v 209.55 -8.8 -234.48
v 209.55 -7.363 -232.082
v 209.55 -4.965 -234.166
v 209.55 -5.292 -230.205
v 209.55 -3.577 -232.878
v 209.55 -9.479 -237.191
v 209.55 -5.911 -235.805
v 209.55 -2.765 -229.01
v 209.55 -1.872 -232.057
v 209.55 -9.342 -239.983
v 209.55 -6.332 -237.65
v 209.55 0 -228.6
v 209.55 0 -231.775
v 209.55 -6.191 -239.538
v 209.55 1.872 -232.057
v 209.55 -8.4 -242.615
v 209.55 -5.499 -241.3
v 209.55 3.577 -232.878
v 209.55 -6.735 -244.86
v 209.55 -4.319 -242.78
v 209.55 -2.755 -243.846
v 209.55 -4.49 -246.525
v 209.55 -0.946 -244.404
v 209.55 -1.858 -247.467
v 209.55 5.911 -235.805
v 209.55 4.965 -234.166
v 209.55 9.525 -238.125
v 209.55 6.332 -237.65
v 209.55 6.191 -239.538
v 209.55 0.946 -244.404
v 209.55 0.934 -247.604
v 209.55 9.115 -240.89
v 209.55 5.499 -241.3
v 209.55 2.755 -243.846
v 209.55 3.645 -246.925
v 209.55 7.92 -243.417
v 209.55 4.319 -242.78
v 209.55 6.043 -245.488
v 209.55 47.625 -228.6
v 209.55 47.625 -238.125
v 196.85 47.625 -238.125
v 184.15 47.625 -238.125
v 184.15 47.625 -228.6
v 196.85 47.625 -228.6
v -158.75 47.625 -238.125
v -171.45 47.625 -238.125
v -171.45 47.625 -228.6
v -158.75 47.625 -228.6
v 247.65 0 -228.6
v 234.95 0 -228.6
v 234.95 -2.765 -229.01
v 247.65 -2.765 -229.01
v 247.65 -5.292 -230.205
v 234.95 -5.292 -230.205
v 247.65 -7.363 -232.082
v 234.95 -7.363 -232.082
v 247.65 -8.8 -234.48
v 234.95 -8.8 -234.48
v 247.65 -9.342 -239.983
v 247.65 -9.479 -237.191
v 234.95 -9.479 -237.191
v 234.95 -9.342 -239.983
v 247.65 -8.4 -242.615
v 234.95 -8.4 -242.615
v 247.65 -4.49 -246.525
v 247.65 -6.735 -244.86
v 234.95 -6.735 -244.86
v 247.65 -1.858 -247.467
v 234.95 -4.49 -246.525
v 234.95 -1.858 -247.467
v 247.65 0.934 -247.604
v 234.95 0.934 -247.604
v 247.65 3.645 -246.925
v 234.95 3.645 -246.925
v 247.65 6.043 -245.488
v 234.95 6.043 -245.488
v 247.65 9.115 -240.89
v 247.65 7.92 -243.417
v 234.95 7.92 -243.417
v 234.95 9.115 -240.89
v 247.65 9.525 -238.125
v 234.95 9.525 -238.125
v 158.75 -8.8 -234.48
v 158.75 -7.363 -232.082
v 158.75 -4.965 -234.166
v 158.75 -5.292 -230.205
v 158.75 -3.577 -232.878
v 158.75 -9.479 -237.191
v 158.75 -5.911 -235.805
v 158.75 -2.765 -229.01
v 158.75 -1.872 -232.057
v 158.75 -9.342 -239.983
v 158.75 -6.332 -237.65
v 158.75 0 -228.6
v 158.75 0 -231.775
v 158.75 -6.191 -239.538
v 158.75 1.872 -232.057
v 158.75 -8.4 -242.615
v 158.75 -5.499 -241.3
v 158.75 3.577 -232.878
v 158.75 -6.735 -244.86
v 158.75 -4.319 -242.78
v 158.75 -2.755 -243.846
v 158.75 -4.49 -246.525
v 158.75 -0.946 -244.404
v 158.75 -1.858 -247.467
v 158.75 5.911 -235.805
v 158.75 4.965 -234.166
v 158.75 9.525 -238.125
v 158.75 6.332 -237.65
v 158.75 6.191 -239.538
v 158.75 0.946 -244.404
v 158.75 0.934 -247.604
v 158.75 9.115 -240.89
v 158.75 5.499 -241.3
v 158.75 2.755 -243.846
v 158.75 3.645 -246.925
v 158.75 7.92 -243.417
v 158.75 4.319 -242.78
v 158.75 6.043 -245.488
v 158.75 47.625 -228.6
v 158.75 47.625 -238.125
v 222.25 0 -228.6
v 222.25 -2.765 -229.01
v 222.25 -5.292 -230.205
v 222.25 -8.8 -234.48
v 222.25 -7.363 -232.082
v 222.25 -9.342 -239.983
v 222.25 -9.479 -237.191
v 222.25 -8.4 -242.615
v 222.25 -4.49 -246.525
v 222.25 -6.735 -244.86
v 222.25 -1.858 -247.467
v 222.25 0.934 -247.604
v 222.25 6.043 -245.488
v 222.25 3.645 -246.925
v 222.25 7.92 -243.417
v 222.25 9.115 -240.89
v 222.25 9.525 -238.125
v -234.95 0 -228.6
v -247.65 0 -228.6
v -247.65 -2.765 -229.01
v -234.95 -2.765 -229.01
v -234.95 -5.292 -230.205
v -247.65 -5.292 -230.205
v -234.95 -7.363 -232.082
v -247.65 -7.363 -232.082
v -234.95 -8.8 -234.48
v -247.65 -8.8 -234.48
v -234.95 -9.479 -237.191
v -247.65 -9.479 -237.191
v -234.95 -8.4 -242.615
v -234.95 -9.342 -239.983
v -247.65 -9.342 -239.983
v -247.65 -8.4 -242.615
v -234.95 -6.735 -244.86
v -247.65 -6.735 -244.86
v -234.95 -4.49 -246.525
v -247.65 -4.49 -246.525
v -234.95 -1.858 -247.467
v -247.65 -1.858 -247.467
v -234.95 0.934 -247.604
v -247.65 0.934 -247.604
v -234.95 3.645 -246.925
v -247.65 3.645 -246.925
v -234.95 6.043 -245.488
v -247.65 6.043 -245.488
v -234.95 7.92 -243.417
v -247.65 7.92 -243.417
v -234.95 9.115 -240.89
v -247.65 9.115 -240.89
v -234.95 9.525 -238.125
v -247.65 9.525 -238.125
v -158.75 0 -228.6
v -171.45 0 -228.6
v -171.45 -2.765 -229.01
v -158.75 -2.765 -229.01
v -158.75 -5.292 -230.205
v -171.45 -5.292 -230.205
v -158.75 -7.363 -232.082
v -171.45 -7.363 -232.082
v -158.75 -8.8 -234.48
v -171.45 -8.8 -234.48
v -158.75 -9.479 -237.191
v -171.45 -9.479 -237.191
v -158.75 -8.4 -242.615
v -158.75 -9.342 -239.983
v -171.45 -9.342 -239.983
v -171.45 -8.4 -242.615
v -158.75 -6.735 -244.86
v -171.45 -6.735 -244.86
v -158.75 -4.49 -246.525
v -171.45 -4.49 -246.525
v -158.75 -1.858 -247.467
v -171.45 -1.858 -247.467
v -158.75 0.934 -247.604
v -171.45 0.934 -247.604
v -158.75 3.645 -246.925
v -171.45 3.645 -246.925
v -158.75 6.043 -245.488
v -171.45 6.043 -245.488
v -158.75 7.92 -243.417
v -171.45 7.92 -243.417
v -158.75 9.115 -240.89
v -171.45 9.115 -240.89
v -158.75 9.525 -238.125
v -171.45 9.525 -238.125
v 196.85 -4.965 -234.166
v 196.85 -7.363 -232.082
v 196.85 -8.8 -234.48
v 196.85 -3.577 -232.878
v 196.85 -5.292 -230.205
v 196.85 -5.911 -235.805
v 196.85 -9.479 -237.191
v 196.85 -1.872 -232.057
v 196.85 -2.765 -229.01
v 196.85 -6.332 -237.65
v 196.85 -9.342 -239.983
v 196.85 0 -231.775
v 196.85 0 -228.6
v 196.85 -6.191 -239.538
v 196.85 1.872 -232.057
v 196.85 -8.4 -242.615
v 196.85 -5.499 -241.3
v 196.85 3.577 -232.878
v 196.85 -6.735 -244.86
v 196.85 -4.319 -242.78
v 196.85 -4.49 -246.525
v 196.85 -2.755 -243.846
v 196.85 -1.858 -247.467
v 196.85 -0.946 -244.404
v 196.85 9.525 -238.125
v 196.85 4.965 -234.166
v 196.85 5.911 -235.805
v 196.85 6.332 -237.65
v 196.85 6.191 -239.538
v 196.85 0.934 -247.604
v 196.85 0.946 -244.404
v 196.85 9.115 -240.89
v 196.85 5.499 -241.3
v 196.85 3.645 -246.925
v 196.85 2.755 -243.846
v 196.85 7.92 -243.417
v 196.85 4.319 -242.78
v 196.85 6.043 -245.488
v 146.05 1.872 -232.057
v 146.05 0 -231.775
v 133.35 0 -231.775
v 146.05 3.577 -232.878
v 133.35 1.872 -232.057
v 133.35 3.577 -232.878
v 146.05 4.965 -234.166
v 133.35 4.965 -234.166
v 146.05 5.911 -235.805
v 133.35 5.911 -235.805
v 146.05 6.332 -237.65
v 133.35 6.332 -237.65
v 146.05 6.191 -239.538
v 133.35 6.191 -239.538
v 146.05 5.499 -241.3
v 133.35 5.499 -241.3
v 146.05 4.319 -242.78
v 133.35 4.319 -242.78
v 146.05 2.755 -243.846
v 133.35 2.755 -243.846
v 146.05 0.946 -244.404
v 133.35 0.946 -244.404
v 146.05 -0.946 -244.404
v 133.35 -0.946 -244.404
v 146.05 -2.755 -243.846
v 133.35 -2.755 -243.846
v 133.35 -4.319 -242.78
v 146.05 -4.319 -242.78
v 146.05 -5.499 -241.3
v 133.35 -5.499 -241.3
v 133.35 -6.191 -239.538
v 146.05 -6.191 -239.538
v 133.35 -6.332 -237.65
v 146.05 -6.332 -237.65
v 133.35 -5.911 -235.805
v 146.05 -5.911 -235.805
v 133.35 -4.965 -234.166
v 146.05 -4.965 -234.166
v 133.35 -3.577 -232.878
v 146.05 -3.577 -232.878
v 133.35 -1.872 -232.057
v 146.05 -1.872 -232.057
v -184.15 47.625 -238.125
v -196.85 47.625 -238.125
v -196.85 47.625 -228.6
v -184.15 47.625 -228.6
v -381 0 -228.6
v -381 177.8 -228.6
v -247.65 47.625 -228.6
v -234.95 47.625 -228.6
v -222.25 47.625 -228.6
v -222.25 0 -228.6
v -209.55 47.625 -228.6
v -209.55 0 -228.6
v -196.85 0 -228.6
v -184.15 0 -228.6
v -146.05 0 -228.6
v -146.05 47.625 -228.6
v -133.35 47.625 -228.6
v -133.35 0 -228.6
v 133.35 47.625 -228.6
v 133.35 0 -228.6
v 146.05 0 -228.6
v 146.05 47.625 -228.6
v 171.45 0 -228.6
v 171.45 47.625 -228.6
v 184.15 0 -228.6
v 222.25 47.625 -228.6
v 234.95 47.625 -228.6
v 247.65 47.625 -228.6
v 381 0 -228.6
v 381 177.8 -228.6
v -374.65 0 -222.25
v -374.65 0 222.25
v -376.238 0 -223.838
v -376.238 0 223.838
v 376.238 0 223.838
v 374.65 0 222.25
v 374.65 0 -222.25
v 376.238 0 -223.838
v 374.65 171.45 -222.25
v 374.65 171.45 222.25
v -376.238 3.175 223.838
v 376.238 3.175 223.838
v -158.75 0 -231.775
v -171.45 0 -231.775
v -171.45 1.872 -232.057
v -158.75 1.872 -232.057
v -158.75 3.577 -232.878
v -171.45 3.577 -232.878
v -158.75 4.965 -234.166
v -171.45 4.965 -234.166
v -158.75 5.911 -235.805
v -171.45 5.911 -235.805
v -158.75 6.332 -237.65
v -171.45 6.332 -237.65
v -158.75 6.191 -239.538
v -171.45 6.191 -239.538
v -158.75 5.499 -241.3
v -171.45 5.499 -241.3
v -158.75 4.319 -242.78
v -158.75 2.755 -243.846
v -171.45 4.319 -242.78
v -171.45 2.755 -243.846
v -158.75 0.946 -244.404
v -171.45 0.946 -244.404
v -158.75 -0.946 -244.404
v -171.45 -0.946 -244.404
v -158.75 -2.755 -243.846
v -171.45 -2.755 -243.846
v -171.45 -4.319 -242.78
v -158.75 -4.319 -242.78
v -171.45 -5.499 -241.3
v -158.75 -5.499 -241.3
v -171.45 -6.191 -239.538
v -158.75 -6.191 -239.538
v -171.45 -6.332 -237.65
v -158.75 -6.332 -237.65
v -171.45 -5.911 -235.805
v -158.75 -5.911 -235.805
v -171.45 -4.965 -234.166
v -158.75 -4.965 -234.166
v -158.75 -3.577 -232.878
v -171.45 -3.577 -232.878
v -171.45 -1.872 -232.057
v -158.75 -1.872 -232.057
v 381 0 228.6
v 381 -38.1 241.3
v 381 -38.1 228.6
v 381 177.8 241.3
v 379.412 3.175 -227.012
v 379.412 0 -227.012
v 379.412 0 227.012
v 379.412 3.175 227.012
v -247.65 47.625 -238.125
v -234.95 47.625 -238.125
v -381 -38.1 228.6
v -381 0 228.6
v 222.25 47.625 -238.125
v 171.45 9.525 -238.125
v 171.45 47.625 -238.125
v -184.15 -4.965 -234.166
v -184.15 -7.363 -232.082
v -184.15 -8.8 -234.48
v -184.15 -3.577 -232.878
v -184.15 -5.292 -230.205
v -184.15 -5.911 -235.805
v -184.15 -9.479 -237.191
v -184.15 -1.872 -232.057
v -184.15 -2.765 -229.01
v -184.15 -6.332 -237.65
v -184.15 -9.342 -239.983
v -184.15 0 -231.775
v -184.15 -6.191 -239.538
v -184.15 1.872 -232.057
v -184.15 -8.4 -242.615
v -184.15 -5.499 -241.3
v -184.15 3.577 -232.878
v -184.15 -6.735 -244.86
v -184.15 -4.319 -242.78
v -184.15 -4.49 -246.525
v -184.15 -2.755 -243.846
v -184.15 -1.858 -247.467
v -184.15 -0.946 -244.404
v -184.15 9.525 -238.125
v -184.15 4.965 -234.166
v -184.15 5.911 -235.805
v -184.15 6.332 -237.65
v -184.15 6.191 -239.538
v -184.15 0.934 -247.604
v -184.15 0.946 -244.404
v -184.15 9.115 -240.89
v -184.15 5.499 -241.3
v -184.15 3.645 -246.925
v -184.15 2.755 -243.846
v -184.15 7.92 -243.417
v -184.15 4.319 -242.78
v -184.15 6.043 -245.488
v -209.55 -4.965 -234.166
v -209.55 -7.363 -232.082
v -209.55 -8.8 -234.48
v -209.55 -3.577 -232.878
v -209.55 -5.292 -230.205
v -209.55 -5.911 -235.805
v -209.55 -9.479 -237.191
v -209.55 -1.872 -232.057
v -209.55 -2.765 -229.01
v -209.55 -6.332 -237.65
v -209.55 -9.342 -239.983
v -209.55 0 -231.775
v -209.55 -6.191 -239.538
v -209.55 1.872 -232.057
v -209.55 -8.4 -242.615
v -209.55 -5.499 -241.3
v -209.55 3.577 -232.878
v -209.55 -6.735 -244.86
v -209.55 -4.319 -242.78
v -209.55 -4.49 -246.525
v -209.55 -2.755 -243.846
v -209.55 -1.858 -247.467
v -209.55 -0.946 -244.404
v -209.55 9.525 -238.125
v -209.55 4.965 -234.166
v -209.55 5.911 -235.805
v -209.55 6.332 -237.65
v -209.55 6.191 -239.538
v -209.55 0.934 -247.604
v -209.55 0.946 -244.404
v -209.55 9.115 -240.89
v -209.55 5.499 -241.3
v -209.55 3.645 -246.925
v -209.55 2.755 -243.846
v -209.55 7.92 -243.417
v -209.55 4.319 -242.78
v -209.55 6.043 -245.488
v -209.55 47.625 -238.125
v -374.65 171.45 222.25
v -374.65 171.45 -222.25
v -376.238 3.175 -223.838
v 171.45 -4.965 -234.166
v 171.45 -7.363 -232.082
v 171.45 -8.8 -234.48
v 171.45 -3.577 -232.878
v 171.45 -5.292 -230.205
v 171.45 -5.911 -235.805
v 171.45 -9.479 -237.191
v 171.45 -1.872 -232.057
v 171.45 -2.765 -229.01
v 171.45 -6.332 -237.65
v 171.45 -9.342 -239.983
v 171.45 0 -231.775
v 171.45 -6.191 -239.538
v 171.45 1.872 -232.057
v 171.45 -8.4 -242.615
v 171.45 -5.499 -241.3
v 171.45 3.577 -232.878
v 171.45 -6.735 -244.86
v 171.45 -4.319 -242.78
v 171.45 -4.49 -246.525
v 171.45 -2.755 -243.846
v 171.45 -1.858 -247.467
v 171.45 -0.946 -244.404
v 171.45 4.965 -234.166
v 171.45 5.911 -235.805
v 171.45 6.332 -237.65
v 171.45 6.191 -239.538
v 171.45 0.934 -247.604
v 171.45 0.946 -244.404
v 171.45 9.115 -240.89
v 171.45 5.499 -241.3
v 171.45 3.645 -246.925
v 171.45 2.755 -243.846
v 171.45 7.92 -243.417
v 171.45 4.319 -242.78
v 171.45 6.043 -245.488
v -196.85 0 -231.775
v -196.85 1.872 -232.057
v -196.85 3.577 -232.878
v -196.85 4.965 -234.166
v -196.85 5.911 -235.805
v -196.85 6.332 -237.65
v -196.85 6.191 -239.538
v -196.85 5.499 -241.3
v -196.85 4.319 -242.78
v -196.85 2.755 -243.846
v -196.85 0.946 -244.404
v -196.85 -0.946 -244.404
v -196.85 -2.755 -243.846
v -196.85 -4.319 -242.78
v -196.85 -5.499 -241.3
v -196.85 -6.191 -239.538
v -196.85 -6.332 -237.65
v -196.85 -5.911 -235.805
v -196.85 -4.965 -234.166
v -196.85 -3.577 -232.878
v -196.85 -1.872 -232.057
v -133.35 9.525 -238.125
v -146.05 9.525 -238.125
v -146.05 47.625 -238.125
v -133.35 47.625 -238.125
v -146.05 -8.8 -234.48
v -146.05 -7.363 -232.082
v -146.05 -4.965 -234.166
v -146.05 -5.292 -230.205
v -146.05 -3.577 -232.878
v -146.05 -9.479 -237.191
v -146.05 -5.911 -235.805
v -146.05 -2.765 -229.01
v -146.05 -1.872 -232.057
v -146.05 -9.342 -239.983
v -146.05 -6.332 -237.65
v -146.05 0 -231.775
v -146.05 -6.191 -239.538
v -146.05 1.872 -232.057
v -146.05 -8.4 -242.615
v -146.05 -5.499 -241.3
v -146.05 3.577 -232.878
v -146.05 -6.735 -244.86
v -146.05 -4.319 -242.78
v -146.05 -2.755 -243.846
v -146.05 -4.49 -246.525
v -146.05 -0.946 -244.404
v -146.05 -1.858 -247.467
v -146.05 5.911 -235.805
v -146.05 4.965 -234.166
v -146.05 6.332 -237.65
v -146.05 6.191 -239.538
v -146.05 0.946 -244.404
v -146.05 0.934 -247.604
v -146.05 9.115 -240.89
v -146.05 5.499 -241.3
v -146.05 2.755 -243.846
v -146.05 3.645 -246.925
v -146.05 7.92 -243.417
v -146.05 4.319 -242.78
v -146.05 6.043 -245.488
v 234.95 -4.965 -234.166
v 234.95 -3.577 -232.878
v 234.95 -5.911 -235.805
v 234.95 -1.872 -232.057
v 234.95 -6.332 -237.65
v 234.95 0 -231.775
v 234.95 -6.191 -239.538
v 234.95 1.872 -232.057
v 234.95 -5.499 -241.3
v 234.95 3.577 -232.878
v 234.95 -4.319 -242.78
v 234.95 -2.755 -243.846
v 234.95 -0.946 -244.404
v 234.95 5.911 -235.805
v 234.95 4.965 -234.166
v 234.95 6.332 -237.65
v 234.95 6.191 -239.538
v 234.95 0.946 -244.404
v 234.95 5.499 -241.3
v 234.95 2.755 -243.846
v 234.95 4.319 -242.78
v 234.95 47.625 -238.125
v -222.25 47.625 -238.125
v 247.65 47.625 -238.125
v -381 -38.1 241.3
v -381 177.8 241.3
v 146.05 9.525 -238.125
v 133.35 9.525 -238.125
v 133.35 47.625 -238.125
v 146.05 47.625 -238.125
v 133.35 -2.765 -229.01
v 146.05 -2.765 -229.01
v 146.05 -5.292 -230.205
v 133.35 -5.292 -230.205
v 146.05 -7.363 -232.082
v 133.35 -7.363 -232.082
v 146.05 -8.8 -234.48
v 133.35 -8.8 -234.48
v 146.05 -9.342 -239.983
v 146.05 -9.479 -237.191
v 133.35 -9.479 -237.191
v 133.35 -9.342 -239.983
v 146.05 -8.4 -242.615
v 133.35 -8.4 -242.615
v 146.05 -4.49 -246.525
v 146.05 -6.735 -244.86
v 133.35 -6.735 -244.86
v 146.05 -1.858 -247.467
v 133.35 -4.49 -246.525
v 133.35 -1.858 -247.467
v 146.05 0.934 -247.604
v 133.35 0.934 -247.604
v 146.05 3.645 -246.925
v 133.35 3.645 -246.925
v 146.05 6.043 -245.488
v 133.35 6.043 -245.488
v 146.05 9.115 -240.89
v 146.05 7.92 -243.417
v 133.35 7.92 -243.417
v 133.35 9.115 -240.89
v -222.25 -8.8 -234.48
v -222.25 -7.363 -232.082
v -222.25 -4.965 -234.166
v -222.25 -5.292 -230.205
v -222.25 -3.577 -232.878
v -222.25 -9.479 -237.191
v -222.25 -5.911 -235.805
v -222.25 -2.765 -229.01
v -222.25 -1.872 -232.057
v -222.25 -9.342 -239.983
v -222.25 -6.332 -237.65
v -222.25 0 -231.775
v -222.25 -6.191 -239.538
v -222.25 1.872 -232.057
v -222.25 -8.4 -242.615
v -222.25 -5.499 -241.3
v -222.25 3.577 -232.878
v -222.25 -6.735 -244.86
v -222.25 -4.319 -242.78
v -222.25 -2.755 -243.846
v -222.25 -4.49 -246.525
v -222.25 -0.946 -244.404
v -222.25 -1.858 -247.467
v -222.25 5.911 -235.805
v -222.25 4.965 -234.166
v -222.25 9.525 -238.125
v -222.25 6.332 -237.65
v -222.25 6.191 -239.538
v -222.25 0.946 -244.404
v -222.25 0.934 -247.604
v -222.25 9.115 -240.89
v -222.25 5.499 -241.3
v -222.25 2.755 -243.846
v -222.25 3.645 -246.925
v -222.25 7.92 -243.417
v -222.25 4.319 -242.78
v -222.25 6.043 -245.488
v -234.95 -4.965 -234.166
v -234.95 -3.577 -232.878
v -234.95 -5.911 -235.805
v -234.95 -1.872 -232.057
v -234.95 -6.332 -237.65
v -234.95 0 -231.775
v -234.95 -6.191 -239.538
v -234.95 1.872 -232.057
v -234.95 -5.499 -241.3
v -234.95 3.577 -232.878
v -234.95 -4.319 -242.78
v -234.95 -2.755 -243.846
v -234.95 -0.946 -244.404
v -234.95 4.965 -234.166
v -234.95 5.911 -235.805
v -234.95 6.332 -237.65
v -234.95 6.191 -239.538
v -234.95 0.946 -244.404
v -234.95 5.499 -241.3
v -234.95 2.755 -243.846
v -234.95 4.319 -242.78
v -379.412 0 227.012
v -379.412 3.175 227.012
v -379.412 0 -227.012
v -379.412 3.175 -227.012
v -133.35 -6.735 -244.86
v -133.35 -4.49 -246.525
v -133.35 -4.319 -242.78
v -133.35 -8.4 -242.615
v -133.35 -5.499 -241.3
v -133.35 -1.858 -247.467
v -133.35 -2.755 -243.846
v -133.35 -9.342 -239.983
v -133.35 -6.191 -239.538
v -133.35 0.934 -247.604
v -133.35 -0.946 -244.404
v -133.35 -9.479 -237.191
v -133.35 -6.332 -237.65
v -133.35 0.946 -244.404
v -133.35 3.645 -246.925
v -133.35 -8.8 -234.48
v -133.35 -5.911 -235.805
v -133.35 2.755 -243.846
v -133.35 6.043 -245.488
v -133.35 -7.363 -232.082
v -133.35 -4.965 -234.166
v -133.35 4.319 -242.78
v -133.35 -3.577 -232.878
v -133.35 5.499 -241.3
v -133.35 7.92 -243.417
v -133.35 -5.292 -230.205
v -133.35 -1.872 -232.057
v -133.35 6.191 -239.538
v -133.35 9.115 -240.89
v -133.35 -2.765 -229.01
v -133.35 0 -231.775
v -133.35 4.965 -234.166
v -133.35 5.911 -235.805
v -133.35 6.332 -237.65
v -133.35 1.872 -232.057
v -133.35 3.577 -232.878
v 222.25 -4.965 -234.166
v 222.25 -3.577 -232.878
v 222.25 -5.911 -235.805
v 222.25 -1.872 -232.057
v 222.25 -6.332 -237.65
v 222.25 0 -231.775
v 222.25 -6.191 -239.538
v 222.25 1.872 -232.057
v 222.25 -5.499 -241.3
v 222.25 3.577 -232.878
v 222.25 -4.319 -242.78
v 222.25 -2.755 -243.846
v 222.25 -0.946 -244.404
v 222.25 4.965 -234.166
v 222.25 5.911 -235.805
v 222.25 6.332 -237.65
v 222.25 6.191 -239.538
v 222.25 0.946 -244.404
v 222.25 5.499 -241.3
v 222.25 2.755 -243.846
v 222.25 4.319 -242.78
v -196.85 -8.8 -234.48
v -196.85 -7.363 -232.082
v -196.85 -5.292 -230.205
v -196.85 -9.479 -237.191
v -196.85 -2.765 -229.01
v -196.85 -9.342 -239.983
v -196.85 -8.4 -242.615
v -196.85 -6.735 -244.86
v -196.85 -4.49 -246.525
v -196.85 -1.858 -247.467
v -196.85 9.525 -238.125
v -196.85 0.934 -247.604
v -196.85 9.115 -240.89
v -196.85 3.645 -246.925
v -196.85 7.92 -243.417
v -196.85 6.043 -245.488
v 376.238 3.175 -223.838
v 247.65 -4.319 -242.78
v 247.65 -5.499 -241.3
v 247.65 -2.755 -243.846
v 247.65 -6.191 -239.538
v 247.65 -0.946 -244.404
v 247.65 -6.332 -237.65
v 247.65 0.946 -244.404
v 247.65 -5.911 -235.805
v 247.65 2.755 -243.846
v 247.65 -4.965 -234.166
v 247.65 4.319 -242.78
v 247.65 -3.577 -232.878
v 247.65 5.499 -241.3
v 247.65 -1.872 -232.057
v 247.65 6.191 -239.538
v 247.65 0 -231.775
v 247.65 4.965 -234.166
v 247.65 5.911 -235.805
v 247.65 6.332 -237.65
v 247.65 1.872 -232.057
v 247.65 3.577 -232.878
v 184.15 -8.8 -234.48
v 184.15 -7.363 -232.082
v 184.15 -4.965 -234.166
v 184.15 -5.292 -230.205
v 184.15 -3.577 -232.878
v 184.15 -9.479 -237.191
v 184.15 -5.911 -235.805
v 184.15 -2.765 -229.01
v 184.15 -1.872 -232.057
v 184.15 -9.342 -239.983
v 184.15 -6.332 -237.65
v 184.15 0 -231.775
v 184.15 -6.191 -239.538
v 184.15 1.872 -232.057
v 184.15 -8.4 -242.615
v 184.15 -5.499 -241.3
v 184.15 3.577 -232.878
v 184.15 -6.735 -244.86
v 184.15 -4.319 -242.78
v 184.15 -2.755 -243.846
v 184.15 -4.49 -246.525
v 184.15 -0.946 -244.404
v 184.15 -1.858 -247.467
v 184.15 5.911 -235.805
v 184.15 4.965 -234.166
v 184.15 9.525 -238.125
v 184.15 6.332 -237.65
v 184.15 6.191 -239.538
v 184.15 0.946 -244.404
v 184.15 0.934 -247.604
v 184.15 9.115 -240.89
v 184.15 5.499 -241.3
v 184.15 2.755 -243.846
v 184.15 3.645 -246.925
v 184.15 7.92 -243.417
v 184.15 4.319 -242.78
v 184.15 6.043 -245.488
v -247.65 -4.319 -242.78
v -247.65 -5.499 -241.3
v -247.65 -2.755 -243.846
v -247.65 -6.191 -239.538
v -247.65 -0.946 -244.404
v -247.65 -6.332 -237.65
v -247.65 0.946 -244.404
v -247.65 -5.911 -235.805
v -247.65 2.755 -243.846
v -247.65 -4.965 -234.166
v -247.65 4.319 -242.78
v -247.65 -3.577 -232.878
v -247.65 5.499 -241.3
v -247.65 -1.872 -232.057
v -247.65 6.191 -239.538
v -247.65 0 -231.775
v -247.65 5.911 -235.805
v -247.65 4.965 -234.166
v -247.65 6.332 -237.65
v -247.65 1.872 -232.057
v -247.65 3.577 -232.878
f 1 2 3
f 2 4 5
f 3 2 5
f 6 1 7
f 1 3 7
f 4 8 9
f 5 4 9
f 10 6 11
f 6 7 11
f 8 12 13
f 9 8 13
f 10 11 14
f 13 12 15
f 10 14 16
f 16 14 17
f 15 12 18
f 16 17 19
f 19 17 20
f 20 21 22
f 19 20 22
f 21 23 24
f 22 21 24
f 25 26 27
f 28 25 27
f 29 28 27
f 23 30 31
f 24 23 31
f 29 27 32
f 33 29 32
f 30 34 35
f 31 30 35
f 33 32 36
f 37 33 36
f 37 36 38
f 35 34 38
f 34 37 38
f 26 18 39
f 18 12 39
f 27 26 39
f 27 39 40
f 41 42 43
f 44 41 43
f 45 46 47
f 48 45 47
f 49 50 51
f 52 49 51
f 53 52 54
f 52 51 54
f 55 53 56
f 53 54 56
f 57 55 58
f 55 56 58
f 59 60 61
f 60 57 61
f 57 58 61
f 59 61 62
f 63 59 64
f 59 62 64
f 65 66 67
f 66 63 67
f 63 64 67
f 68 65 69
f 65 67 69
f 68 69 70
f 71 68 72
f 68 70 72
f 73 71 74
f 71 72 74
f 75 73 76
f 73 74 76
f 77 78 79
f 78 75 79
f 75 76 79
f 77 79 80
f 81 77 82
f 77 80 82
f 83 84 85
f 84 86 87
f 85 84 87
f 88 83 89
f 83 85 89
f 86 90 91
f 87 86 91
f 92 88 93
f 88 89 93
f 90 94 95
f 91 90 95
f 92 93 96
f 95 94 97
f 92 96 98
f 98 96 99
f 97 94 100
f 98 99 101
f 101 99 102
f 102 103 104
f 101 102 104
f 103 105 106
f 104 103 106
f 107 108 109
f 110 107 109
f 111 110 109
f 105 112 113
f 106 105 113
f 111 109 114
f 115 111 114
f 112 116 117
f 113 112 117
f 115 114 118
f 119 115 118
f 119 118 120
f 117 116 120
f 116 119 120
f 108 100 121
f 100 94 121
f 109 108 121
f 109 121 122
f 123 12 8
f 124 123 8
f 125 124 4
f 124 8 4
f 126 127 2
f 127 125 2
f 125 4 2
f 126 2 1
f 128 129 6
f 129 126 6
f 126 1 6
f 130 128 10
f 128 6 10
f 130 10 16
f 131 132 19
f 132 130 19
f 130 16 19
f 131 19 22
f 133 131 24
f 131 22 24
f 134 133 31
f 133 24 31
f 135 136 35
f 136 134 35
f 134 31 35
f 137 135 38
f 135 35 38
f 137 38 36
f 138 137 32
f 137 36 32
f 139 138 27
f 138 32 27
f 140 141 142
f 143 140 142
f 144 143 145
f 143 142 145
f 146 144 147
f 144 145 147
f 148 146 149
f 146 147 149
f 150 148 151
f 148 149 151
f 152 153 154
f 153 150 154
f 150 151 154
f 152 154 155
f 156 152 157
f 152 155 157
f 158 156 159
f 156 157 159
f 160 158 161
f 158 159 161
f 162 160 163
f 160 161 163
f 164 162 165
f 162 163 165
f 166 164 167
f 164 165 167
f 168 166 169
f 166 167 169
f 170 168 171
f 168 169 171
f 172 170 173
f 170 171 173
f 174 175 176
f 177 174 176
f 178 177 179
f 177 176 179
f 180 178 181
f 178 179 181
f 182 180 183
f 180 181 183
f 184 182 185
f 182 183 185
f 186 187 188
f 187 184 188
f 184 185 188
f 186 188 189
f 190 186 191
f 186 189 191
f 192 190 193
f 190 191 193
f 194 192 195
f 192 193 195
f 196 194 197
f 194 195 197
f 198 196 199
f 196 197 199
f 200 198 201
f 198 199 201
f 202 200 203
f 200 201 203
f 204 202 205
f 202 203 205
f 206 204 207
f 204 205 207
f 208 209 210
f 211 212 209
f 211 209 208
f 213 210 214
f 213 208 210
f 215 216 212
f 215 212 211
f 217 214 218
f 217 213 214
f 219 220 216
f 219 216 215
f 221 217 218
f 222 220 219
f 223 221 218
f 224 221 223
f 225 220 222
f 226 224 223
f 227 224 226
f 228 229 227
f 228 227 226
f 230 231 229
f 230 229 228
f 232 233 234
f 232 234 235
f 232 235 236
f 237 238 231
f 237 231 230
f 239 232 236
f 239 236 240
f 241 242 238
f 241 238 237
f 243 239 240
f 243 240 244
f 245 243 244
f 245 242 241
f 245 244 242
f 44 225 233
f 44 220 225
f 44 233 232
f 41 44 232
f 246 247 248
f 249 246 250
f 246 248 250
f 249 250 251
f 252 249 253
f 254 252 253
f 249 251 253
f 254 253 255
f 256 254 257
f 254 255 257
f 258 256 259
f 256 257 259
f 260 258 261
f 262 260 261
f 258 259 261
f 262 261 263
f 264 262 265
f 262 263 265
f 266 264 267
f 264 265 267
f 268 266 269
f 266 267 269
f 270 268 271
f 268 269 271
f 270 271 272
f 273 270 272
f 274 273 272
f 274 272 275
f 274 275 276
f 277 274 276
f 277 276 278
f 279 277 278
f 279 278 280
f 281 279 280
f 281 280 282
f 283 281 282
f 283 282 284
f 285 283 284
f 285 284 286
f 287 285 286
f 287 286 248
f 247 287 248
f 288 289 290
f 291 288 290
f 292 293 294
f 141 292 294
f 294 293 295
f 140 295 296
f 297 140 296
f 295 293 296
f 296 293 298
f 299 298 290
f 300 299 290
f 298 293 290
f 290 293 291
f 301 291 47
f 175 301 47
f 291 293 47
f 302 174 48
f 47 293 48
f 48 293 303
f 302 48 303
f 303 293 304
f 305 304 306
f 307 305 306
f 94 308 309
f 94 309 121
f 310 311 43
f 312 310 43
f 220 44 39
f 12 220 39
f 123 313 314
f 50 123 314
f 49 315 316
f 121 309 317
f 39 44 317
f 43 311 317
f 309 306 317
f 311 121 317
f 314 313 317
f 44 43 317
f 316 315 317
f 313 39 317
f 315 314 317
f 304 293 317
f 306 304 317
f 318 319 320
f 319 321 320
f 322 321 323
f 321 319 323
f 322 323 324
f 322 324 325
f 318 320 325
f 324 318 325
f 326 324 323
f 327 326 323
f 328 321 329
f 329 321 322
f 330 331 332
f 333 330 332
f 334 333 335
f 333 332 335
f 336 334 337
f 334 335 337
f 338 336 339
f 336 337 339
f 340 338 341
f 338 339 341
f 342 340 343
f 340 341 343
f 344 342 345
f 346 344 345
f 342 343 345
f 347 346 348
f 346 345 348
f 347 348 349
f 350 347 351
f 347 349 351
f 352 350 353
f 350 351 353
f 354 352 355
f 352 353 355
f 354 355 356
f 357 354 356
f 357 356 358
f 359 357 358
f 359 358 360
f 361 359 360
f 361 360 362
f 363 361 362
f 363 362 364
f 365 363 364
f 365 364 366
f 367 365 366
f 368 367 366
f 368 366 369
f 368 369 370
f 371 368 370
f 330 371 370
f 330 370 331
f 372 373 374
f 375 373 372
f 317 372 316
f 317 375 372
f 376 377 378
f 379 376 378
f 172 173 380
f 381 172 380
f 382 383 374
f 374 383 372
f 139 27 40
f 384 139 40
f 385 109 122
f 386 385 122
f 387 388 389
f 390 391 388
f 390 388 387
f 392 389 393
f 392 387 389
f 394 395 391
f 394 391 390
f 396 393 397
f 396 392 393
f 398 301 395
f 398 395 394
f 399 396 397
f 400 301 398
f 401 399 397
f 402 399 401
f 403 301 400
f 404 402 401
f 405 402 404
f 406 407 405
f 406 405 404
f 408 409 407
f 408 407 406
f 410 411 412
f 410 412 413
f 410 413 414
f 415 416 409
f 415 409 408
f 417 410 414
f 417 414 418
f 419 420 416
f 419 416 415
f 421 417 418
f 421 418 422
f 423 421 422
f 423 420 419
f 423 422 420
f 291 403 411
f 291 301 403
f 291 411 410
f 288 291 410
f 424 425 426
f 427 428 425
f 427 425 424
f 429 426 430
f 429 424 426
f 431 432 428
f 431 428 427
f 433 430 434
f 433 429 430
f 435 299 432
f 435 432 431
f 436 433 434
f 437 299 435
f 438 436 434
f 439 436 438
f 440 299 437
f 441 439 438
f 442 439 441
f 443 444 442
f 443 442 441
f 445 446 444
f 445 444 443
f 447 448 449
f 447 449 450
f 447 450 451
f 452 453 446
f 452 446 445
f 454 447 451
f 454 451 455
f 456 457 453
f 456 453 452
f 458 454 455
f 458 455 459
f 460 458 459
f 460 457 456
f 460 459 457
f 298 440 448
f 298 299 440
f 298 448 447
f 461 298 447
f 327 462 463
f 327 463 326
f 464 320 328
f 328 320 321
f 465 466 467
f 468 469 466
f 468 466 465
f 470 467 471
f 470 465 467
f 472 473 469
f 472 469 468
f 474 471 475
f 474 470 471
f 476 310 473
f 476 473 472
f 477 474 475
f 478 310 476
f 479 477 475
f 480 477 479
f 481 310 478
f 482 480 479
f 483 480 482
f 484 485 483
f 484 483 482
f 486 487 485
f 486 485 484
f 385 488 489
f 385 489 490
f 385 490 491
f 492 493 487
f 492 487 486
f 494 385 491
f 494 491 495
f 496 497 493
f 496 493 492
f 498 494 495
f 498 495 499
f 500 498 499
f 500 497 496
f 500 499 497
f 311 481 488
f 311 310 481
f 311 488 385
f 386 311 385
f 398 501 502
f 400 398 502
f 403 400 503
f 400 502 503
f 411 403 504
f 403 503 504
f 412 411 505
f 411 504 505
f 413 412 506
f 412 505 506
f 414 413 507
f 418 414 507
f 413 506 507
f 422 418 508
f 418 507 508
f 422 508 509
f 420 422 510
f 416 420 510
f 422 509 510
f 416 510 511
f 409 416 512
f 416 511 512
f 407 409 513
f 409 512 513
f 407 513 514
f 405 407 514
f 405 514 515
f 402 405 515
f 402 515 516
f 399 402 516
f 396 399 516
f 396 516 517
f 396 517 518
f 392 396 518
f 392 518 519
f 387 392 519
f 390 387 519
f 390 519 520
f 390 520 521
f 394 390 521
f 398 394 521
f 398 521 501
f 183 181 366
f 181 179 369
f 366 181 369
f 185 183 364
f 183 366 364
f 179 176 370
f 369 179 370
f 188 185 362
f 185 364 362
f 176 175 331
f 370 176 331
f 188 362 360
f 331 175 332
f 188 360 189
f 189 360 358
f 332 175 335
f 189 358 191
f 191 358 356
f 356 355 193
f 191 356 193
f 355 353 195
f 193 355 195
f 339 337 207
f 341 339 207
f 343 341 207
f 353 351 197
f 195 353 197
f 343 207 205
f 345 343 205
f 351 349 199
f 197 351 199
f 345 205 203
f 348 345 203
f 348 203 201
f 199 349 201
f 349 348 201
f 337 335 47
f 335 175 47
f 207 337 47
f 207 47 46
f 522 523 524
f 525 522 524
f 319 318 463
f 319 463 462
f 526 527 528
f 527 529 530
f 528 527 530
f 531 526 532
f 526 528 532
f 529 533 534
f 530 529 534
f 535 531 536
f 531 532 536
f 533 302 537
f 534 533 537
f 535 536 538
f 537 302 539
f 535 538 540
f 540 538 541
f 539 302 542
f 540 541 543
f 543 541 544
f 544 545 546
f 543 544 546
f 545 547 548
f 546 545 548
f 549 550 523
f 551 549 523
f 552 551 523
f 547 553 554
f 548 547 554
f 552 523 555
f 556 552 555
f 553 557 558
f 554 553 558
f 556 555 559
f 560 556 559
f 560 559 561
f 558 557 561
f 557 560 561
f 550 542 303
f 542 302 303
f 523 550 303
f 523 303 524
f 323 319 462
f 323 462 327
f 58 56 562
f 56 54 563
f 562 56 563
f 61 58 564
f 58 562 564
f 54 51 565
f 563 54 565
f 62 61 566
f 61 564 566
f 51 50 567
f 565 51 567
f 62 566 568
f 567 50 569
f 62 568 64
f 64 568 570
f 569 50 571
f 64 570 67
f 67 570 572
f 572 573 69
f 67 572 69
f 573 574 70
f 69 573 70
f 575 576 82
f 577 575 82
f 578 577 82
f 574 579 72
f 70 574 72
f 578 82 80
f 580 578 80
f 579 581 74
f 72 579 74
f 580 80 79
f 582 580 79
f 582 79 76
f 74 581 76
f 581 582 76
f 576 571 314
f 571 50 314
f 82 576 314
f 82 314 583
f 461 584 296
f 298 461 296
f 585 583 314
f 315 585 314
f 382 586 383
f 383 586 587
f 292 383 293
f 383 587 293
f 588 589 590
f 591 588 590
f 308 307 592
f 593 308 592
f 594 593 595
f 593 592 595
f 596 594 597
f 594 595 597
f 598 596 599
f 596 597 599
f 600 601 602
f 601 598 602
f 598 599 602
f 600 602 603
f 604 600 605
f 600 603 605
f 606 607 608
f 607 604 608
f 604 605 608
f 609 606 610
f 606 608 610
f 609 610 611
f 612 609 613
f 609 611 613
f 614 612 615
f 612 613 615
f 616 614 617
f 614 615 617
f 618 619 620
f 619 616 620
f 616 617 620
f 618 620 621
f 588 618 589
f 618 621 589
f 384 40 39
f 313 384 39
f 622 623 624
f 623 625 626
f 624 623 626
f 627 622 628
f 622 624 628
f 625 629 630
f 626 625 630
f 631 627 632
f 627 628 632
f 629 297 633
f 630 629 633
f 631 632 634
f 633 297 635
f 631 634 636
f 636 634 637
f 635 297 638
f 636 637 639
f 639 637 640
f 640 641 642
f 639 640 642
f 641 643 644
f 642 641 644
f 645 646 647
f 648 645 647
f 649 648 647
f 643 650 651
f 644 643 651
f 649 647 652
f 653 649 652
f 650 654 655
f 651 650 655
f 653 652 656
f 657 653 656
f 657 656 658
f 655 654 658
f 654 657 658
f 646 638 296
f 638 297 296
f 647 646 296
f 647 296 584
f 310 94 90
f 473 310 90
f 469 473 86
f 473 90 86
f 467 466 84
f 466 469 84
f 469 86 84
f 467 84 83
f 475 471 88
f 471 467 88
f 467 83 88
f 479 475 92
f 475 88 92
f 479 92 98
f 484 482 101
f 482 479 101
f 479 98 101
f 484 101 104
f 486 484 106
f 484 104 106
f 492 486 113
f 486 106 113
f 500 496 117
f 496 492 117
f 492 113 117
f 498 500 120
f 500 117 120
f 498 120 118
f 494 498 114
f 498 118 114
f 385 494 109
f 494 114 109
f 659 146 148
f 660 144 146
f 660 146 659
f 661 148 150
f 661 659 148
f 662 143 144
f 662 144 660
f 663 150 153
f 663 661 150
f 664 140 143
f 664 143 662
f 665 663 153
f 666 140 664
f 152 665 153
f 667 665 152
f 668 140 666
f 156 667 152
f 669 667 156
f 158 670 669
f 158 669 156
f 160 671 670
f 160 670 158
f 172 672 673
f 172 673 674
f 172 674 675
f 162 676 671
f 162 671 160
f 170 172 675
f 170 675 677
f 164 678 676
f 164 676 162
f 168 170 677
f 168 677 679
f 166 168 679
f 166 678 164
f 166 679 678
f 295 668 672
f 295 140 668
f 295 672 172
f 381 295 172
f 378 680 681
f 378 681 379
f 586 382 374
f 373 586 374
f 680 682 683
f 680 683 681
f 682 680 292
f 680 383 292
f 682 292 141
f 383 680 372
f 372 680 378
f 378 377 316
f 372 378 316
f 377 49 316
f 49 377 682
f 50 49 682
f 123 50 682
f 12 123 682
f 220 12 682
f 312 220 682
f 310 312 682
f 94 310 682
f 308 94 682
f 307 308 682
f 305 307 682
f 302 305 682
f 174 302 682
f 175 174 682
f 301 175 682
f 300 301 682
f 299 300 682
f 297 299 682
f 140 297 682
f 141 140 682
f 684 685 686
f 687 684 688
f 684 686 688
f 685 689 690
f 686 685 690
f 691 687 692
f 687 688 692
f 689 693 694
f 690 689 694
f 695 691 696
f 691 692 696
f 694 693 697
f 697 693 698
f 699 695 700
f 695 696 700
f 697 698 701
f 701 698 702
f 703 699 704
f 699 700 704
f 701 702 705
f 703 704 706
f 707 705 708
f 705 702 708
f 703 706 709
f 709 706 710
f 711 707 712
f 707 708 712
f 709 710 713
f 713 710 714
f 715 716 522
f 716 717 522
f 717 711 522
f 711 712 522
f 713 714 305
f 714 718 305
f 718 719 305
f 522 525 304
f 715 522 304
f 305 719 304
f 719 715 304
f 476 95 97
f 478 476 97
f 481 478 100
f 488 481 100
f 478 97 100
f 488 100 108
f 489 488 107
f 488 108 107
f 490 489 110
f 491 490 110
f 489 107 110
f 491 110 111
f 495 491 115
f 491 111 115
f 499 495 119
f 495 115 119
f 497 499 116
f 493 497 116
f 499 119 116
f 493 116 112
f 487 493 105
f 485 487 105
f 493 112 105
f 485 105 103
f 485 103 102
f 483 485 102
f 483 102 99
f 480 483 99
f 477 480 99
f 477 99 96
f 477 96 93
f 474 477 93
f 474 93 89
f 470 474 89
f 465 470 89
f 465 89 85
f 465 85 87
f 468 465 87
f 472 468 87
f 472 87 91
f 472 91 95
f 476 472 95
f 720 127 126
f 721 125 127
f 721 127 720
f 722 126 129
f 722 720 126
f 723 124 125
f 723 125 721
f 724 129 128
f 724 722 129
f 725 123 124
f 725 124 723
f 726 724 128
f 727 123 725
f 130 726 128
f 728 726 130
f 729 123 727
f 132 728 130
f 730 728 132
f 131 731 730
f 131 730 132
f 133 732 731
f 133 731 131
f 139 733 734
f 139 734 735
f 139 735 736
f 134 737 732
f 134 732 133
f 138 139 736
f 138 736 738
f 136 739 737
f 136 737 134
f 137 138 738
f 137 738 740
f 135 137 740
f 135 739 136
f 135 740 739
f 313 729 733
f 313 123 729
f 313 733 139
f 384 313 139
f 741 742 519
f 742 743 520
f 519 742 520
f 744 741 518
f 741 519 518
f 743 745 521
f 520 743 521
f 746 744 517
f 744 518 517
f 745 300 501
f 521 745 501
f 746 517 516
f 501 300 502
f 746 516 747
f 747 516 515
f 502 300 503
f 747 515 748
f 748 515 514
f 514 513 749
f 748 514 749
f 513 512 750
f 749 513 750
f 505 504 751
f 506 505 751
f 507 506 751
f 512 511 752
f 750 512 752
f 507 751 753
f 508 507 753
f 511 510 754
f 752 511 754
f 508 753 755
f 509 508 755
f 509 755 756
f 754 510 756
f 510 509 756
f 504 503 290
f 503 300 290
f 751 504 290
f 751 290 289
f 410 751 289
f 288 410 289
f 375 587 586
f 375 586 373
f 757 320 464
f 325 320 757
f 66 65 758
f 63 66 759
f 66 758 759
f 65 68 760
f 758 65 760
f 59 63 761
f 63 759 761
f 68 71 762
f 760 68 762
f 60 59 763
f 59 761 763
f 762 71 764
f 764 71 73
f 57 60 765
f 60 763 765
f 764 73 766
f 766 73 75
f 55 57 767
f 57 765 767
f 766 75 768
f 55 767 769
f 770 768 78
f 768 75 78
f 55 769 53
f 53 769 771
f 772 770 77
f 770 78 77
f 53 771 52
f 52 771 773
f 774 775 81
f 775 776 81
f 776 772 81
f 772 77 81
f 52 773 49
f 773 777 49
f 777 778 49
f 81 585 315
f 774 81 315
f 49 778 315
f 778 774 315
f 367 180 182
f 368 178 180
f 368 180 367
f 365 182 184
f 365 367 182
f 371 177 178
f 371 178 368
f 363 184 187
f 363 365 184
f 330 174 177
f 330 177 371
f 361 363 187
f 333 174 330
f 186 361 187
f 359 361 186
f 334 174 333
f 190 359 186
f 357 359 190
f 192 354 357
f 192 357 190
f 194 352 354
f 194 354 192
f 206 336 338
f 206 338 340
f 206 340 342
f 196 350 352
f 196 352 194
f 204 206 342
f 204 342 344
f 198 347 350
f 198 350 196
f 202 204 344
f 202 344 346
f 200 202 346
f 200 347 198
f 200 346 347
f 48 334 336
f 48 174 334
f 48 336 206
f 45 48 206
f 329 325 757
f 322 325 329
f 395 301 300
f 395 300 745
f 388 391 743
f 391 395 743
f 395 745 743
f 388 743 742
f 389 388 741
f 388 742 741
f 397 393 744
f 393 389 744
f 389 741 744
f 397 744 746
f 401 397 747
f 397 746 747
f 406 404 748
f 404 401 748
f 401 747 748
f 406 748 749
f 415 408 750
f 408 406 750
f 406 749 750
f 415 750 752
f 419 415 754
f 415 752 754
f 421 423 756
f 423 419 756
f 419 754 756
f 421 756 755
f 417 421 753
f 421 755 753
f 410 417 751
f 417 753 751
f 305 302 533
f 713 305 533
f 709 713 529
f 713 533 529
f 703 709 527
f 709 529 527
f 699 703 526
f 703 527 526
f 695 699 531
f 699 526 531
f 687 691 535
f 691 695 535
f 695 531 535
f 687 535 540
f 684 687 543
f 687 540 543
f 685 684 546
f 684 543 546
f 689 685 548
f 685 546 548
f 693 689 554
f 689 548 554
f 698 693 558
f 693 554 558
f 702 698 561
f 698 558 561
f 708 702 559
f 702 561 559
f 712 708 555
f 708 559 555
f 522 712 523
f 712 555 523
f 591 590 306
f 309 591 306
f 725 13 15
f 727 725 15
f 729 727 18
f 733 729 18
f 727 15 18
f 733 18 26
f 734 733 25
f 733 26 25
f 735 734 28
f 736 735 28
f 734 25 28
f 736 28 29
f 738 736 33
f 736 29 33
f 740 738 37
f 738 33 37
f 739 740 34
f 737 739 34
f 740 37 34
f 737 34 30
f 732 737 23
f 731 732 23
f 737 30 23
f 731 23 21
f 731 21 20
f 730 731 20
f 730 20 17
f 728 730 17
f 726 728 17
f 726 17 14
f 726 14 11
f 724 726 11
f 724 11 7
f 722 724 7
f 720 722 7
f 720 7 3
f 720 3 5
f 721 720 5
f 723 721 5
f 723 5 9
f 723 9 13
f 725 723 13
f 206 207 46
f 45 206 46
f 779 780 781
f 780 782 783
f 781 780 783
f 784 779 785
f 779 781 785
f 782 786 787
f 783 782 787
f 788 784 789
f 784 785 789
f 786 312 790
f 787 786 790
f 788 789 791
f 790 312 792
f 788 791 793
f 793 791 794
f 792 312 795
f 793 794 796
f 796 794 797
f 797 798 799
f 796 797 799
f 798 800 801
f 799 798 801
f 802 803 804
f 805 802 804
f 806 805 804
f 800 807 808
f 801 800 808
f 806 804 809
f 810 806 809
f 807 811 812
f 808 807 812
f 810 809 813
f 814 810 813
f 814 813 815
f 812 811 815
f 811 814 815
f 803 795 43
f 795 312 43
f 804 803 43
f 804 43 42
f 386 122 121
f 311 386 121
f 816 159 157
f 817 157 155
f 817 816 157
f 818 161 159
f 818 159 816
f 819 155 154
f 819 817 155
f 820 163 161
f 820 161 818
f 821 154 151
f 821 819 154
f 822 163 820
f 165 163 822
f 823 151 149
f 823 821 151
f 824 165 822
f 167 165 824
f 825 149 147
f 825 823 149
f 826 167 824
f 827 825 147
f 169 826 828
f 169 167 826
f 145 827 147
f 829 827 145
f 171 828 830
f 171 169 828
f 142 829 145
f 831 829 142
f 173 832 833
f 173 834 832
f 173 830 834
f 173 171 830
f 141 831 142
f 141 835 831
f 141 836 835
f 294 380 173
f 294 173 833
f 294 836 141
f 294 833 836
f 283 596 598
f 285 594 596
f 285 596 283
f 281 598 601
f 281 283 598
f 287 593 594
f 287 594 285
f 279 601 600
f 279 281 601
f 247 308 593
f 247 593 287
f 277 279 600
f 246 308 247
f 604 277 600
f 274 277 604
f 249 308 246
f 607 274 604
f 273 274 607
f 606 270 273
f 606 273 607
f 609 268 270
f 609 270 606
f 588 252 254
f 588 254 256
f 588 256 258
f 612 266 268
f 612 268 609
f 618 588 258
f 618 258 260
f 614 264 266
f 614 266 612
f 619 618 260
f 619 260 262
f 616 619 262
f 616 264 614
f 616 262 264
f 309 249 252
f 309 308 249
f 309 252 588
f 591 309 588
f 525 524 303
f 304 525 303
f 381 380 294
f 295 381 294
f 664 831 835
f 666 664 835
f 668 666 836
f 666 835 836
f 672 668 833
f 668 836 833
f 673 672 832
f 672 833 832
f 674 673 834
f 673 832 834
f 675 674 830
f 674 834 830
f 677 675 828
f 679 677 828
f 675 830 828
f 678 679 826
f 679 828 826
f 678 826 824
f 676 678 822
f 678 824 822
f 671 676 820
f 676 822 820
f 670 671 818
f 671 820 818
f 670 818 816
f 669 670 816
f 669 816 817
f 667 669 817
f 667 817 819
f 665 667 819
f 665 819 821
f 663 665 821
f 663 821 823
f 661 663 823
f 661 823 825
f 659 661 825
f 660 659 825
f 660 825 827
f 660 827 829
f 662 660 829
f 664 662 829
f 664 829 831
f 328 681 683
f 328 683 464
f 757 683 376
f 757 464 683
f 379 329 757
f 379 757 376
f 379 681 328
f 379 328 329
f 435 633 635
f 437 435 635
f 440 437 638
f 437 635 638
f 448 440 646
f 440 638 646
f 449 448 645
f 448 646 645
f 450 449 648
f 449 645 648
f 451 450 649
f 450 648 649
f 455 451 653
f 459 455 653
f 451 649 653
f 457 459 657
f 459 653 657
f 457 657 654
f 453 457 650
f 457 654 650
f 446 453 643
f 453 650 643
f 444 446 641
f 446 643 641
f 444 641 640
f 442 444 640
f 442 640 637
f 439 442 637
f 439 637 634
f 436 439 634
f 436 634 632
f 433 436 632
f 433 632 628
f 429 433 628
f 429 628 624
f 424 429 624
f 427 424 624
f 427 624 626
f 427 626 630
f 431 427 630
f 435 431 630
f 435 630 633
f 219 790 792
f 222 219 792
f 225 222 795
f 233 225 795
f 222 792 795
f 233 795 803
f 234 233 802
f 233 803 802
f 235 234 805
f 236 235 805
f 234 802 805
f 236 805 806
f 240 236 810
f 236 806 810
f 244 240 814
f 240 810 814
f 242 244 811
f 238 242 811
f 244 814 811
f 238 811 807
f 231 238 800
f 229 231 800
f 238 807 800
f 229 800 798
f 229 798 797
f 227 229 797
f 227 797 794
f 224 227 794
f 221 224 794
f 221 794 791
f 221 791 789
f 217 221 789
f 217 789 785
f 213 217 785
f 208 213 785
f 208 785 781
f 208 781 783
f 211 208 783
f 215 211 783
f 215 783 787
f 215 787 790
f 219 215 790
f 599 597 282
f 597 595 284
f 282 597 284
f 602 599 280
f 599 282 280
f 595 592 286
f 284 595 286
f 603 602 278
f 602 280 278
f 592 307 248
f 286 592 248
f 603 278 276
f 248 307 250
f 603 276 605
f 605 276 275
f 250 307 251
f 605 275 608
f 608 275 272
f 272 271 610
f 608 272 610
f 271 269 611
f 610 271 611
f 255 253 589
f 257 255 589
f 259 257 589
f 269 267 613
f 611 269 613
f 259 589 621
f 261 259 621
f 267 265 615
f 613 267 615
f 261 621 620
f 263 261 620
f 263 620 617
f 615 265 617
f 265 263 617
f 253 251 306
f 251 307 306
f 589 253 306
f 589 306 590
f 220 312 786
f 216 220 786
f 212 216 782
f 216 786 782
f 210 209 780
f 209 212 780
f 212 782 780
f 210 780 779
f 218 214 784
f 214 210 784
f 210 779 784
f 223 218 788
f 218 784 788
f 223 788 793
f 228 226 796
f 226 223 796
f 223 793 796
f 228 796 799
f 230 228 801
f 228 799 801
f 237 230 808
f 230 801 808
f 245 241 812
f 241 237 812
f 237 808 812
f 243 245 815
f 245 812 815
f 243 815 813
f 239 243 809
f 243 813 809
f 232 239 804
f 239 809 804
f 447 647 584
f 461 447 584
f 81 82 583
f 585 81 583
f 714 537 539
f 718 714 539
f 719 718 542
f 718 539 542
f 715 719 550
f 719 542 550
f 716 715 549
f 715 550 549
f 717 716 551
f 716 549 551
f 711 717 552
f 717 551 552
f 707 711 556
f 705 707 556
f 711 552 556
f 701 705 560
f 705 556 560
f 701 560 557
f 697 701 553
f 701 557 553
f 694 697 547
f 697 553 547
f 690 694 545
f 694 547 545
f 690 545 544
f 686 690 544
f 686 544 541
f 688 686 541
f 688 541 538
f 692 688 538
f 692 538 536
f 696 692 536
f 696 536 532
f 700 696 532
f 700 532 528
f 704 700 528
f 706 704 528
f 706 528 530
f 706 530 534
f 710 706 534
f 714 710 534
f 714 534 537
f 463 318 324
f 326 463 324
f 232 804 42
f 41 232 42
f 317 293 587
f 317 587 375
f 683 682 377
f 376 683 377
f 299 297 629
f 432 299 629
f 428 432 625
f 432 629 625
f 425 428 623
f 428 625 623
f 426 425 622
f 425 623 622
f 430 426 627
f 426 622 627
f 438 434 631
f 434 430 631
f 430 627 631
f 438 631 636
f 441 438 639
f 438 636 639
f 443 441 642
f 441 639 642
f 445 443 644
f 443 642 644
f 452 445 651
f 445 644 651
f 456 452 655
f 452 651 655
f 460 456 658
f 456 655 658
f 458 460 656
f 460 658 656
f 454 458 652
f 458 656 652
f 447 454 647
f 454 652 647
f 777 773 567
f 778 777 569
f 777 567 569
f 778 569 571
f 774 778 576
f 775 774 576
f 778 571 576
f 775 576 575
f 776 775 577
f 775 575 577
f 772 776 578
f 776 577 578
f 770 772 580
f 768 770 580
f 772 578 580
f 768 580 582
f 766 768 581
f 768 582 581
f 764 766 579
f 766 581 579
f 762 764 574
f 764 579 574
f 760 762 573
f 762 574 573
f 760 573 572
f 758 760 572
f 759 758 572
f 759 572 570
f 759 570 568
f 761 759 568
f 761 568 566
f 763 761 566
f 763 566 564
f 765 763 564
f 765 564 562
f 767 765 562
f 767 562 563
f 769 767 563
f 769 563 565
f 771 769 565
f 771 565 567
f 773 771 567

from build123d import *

# Parameters (mm, degrees)
SKETCH1_W                = 762
SKETCH1_H                = 457.2
BOSS_EXTRUDE1_DEPTH      = 177.8
SKETCH2_W                = 749.3
SKETCH2_H                = 444.5
CUT_EXTRUDE1_DEPTH       = 171.45
SKETCH4_W                = 758.825
SKETCH4_H                = 454.025
SKETCH4_W_2              = 752.475
SKETCH4_H_2              = 447.675
CUT_EXTRUDE3_DEPTH       = 3.175
SKETCH5_W                = 762
SKETCH5_H                = 12.7
BOSS_EXTRUDE2_DEPTH      = 177.8
BOSS_EXTRUDE2_DEPTH_BACK = 38.1
SKETCH7_R                = 6.35
BOSS_EXTRUDE3_DEPTH      = 762
SKETCH8_W                = 12.7
SKETCH8_H                = 38.1
CUT_EXTRUDE4_DEPTH       = 202.692


with BuildPart() as part:
    # Sketch1 → Boss-Extrude1 (new body)
    with BuildSketch(Plane(origin=(0, 0, 0), x_dir=(1, 0, 0), z_dir=(0, 1, 0))):
        Rectangle(SKETCH1_W, SKETCH1_H)
    extrude(amount=BOSS_EXTRUDE1_DEPTH)

    # Sketch2 → Cut-Extrude1 (cut)
    with BuildSketch(Plane.XZ):
        Rectangle(SKETCH2_W, SKETCH2_H)
    extrude(amount=-CUT_EXTRUDE1_DEPTH, mode=Mode.SUBTRACT)

    # Sketch4 → Cut-Extrude3 (cut)
    with BuildSketch(Plane.XZ):
        Rectangle(SKETCH4_W, SKETCH4_H)
        Rectangle(SKETCH4_W_2, SKETCH4_H_2, mode=Mode.SUBTRACT)
    extrude(amount=-CUT_EXTRUDE3_DEPTH, mode=Mode.SUBTRACT)

    # Sketch5 → Boss-Extrude2 (add, two sides)
    with BuildSketch(Plane(origin=(0, 0, 0), x_dir=(1, 0, 0), z_dir=(0, 1, 0))) as boss_extrude2_sk:
        with Locations((0, -234.95)):
            Rectangle(SKETCH5_W, SKETCH5_H)
    extrude(amount=BOSS_EXTRUDE2_DEPTH)
    extrude(boss_extrude2_sk.sketch, amount=-BOSS_EXTRUDE2_DEPTH_BACK)

    # Sketch7 → Boss-Extrude3 (add)
    with BuildSketch(Plane.ZY.offset(381)):
        with BuildLine():
            Line((-238.125, 9.525), (-238.125, 47.625))
            Line((-238.125, 47.625), (-228.6, 47.625))
            Line((-228.6, 47.625), (-228.6, 0))
            ThreePointArc((-228.6, 0), (-244.860192091, -6.735192091), (-238.125, 9.525))
        make_face()
        with Locations((-238.125, 0)):
            Circle(SKETCH7_R, mode=Mode.SUBTRACT)
    extrude(amount=-BOSS_EXTRUDE3_DEPTH)

    # Sketch8 → Cut-Extrude4 (cut)
    with BuildSketch(Plane(origin=(0, 177.8, 0), x_dir=(1, 0, 0), z_dir=(0, 1, 0))):
        Polygon((-120.65, 266.7), (-133.35, 266.7), (-133.35, 228.6), (-120.65, 228.6), (120.65, 228.6), (133.35, 228.6), (133.35, 266.7), (120.65, 266.7), align=None)
        with Locations((-152.4, 247.65)):
            Rectangle(SKETCH8_W, SKETCH8_H)
        Polygon((-247.65, 228.6), (-260.35, 228.6), (-381, 228.6), (-381, 266.7), (-260.35, 266.7), (-247.65, 266.7), align=None)
        with Locations((-177.8, 247.65)):
            Rectangle(SKETCH8_W, SKETCH8_H)
        with Locations((-228.6, 247.65)):
            Rectangle(SKETCH8_W, SKETCH8_H)
        with Locations((-203.2, 247.65)):
            Rectangle(SKETCH8_W, SKETCH8_H)
        with Locations((152.4, 247.65)):
            Rectangle(SKETCH8_W, SKETCH8_H)
        with Locations((177.8, 247.65)):
            Rectangle(SKETCH8_W, SKETCH8_H)
        with Locations((203.2, 247.65)):
            Rectangle(SKETCH8_W, SKETCH8_H)
        with Locations((228.6, 247.65)):
            Rectangle(SKETCH8_W, SKETCH8_H)
        Polygon((247.65, 266.7), (247.65, 228.6), (260.35, 228.6), (381, 228.6), (381, 266.7), (260.35, 266.7), align=None)
    extrude(amount=-CUT_EXTRUDE4_DEPTH, mode=Mode.SUBTRACT)


solid = part.part
